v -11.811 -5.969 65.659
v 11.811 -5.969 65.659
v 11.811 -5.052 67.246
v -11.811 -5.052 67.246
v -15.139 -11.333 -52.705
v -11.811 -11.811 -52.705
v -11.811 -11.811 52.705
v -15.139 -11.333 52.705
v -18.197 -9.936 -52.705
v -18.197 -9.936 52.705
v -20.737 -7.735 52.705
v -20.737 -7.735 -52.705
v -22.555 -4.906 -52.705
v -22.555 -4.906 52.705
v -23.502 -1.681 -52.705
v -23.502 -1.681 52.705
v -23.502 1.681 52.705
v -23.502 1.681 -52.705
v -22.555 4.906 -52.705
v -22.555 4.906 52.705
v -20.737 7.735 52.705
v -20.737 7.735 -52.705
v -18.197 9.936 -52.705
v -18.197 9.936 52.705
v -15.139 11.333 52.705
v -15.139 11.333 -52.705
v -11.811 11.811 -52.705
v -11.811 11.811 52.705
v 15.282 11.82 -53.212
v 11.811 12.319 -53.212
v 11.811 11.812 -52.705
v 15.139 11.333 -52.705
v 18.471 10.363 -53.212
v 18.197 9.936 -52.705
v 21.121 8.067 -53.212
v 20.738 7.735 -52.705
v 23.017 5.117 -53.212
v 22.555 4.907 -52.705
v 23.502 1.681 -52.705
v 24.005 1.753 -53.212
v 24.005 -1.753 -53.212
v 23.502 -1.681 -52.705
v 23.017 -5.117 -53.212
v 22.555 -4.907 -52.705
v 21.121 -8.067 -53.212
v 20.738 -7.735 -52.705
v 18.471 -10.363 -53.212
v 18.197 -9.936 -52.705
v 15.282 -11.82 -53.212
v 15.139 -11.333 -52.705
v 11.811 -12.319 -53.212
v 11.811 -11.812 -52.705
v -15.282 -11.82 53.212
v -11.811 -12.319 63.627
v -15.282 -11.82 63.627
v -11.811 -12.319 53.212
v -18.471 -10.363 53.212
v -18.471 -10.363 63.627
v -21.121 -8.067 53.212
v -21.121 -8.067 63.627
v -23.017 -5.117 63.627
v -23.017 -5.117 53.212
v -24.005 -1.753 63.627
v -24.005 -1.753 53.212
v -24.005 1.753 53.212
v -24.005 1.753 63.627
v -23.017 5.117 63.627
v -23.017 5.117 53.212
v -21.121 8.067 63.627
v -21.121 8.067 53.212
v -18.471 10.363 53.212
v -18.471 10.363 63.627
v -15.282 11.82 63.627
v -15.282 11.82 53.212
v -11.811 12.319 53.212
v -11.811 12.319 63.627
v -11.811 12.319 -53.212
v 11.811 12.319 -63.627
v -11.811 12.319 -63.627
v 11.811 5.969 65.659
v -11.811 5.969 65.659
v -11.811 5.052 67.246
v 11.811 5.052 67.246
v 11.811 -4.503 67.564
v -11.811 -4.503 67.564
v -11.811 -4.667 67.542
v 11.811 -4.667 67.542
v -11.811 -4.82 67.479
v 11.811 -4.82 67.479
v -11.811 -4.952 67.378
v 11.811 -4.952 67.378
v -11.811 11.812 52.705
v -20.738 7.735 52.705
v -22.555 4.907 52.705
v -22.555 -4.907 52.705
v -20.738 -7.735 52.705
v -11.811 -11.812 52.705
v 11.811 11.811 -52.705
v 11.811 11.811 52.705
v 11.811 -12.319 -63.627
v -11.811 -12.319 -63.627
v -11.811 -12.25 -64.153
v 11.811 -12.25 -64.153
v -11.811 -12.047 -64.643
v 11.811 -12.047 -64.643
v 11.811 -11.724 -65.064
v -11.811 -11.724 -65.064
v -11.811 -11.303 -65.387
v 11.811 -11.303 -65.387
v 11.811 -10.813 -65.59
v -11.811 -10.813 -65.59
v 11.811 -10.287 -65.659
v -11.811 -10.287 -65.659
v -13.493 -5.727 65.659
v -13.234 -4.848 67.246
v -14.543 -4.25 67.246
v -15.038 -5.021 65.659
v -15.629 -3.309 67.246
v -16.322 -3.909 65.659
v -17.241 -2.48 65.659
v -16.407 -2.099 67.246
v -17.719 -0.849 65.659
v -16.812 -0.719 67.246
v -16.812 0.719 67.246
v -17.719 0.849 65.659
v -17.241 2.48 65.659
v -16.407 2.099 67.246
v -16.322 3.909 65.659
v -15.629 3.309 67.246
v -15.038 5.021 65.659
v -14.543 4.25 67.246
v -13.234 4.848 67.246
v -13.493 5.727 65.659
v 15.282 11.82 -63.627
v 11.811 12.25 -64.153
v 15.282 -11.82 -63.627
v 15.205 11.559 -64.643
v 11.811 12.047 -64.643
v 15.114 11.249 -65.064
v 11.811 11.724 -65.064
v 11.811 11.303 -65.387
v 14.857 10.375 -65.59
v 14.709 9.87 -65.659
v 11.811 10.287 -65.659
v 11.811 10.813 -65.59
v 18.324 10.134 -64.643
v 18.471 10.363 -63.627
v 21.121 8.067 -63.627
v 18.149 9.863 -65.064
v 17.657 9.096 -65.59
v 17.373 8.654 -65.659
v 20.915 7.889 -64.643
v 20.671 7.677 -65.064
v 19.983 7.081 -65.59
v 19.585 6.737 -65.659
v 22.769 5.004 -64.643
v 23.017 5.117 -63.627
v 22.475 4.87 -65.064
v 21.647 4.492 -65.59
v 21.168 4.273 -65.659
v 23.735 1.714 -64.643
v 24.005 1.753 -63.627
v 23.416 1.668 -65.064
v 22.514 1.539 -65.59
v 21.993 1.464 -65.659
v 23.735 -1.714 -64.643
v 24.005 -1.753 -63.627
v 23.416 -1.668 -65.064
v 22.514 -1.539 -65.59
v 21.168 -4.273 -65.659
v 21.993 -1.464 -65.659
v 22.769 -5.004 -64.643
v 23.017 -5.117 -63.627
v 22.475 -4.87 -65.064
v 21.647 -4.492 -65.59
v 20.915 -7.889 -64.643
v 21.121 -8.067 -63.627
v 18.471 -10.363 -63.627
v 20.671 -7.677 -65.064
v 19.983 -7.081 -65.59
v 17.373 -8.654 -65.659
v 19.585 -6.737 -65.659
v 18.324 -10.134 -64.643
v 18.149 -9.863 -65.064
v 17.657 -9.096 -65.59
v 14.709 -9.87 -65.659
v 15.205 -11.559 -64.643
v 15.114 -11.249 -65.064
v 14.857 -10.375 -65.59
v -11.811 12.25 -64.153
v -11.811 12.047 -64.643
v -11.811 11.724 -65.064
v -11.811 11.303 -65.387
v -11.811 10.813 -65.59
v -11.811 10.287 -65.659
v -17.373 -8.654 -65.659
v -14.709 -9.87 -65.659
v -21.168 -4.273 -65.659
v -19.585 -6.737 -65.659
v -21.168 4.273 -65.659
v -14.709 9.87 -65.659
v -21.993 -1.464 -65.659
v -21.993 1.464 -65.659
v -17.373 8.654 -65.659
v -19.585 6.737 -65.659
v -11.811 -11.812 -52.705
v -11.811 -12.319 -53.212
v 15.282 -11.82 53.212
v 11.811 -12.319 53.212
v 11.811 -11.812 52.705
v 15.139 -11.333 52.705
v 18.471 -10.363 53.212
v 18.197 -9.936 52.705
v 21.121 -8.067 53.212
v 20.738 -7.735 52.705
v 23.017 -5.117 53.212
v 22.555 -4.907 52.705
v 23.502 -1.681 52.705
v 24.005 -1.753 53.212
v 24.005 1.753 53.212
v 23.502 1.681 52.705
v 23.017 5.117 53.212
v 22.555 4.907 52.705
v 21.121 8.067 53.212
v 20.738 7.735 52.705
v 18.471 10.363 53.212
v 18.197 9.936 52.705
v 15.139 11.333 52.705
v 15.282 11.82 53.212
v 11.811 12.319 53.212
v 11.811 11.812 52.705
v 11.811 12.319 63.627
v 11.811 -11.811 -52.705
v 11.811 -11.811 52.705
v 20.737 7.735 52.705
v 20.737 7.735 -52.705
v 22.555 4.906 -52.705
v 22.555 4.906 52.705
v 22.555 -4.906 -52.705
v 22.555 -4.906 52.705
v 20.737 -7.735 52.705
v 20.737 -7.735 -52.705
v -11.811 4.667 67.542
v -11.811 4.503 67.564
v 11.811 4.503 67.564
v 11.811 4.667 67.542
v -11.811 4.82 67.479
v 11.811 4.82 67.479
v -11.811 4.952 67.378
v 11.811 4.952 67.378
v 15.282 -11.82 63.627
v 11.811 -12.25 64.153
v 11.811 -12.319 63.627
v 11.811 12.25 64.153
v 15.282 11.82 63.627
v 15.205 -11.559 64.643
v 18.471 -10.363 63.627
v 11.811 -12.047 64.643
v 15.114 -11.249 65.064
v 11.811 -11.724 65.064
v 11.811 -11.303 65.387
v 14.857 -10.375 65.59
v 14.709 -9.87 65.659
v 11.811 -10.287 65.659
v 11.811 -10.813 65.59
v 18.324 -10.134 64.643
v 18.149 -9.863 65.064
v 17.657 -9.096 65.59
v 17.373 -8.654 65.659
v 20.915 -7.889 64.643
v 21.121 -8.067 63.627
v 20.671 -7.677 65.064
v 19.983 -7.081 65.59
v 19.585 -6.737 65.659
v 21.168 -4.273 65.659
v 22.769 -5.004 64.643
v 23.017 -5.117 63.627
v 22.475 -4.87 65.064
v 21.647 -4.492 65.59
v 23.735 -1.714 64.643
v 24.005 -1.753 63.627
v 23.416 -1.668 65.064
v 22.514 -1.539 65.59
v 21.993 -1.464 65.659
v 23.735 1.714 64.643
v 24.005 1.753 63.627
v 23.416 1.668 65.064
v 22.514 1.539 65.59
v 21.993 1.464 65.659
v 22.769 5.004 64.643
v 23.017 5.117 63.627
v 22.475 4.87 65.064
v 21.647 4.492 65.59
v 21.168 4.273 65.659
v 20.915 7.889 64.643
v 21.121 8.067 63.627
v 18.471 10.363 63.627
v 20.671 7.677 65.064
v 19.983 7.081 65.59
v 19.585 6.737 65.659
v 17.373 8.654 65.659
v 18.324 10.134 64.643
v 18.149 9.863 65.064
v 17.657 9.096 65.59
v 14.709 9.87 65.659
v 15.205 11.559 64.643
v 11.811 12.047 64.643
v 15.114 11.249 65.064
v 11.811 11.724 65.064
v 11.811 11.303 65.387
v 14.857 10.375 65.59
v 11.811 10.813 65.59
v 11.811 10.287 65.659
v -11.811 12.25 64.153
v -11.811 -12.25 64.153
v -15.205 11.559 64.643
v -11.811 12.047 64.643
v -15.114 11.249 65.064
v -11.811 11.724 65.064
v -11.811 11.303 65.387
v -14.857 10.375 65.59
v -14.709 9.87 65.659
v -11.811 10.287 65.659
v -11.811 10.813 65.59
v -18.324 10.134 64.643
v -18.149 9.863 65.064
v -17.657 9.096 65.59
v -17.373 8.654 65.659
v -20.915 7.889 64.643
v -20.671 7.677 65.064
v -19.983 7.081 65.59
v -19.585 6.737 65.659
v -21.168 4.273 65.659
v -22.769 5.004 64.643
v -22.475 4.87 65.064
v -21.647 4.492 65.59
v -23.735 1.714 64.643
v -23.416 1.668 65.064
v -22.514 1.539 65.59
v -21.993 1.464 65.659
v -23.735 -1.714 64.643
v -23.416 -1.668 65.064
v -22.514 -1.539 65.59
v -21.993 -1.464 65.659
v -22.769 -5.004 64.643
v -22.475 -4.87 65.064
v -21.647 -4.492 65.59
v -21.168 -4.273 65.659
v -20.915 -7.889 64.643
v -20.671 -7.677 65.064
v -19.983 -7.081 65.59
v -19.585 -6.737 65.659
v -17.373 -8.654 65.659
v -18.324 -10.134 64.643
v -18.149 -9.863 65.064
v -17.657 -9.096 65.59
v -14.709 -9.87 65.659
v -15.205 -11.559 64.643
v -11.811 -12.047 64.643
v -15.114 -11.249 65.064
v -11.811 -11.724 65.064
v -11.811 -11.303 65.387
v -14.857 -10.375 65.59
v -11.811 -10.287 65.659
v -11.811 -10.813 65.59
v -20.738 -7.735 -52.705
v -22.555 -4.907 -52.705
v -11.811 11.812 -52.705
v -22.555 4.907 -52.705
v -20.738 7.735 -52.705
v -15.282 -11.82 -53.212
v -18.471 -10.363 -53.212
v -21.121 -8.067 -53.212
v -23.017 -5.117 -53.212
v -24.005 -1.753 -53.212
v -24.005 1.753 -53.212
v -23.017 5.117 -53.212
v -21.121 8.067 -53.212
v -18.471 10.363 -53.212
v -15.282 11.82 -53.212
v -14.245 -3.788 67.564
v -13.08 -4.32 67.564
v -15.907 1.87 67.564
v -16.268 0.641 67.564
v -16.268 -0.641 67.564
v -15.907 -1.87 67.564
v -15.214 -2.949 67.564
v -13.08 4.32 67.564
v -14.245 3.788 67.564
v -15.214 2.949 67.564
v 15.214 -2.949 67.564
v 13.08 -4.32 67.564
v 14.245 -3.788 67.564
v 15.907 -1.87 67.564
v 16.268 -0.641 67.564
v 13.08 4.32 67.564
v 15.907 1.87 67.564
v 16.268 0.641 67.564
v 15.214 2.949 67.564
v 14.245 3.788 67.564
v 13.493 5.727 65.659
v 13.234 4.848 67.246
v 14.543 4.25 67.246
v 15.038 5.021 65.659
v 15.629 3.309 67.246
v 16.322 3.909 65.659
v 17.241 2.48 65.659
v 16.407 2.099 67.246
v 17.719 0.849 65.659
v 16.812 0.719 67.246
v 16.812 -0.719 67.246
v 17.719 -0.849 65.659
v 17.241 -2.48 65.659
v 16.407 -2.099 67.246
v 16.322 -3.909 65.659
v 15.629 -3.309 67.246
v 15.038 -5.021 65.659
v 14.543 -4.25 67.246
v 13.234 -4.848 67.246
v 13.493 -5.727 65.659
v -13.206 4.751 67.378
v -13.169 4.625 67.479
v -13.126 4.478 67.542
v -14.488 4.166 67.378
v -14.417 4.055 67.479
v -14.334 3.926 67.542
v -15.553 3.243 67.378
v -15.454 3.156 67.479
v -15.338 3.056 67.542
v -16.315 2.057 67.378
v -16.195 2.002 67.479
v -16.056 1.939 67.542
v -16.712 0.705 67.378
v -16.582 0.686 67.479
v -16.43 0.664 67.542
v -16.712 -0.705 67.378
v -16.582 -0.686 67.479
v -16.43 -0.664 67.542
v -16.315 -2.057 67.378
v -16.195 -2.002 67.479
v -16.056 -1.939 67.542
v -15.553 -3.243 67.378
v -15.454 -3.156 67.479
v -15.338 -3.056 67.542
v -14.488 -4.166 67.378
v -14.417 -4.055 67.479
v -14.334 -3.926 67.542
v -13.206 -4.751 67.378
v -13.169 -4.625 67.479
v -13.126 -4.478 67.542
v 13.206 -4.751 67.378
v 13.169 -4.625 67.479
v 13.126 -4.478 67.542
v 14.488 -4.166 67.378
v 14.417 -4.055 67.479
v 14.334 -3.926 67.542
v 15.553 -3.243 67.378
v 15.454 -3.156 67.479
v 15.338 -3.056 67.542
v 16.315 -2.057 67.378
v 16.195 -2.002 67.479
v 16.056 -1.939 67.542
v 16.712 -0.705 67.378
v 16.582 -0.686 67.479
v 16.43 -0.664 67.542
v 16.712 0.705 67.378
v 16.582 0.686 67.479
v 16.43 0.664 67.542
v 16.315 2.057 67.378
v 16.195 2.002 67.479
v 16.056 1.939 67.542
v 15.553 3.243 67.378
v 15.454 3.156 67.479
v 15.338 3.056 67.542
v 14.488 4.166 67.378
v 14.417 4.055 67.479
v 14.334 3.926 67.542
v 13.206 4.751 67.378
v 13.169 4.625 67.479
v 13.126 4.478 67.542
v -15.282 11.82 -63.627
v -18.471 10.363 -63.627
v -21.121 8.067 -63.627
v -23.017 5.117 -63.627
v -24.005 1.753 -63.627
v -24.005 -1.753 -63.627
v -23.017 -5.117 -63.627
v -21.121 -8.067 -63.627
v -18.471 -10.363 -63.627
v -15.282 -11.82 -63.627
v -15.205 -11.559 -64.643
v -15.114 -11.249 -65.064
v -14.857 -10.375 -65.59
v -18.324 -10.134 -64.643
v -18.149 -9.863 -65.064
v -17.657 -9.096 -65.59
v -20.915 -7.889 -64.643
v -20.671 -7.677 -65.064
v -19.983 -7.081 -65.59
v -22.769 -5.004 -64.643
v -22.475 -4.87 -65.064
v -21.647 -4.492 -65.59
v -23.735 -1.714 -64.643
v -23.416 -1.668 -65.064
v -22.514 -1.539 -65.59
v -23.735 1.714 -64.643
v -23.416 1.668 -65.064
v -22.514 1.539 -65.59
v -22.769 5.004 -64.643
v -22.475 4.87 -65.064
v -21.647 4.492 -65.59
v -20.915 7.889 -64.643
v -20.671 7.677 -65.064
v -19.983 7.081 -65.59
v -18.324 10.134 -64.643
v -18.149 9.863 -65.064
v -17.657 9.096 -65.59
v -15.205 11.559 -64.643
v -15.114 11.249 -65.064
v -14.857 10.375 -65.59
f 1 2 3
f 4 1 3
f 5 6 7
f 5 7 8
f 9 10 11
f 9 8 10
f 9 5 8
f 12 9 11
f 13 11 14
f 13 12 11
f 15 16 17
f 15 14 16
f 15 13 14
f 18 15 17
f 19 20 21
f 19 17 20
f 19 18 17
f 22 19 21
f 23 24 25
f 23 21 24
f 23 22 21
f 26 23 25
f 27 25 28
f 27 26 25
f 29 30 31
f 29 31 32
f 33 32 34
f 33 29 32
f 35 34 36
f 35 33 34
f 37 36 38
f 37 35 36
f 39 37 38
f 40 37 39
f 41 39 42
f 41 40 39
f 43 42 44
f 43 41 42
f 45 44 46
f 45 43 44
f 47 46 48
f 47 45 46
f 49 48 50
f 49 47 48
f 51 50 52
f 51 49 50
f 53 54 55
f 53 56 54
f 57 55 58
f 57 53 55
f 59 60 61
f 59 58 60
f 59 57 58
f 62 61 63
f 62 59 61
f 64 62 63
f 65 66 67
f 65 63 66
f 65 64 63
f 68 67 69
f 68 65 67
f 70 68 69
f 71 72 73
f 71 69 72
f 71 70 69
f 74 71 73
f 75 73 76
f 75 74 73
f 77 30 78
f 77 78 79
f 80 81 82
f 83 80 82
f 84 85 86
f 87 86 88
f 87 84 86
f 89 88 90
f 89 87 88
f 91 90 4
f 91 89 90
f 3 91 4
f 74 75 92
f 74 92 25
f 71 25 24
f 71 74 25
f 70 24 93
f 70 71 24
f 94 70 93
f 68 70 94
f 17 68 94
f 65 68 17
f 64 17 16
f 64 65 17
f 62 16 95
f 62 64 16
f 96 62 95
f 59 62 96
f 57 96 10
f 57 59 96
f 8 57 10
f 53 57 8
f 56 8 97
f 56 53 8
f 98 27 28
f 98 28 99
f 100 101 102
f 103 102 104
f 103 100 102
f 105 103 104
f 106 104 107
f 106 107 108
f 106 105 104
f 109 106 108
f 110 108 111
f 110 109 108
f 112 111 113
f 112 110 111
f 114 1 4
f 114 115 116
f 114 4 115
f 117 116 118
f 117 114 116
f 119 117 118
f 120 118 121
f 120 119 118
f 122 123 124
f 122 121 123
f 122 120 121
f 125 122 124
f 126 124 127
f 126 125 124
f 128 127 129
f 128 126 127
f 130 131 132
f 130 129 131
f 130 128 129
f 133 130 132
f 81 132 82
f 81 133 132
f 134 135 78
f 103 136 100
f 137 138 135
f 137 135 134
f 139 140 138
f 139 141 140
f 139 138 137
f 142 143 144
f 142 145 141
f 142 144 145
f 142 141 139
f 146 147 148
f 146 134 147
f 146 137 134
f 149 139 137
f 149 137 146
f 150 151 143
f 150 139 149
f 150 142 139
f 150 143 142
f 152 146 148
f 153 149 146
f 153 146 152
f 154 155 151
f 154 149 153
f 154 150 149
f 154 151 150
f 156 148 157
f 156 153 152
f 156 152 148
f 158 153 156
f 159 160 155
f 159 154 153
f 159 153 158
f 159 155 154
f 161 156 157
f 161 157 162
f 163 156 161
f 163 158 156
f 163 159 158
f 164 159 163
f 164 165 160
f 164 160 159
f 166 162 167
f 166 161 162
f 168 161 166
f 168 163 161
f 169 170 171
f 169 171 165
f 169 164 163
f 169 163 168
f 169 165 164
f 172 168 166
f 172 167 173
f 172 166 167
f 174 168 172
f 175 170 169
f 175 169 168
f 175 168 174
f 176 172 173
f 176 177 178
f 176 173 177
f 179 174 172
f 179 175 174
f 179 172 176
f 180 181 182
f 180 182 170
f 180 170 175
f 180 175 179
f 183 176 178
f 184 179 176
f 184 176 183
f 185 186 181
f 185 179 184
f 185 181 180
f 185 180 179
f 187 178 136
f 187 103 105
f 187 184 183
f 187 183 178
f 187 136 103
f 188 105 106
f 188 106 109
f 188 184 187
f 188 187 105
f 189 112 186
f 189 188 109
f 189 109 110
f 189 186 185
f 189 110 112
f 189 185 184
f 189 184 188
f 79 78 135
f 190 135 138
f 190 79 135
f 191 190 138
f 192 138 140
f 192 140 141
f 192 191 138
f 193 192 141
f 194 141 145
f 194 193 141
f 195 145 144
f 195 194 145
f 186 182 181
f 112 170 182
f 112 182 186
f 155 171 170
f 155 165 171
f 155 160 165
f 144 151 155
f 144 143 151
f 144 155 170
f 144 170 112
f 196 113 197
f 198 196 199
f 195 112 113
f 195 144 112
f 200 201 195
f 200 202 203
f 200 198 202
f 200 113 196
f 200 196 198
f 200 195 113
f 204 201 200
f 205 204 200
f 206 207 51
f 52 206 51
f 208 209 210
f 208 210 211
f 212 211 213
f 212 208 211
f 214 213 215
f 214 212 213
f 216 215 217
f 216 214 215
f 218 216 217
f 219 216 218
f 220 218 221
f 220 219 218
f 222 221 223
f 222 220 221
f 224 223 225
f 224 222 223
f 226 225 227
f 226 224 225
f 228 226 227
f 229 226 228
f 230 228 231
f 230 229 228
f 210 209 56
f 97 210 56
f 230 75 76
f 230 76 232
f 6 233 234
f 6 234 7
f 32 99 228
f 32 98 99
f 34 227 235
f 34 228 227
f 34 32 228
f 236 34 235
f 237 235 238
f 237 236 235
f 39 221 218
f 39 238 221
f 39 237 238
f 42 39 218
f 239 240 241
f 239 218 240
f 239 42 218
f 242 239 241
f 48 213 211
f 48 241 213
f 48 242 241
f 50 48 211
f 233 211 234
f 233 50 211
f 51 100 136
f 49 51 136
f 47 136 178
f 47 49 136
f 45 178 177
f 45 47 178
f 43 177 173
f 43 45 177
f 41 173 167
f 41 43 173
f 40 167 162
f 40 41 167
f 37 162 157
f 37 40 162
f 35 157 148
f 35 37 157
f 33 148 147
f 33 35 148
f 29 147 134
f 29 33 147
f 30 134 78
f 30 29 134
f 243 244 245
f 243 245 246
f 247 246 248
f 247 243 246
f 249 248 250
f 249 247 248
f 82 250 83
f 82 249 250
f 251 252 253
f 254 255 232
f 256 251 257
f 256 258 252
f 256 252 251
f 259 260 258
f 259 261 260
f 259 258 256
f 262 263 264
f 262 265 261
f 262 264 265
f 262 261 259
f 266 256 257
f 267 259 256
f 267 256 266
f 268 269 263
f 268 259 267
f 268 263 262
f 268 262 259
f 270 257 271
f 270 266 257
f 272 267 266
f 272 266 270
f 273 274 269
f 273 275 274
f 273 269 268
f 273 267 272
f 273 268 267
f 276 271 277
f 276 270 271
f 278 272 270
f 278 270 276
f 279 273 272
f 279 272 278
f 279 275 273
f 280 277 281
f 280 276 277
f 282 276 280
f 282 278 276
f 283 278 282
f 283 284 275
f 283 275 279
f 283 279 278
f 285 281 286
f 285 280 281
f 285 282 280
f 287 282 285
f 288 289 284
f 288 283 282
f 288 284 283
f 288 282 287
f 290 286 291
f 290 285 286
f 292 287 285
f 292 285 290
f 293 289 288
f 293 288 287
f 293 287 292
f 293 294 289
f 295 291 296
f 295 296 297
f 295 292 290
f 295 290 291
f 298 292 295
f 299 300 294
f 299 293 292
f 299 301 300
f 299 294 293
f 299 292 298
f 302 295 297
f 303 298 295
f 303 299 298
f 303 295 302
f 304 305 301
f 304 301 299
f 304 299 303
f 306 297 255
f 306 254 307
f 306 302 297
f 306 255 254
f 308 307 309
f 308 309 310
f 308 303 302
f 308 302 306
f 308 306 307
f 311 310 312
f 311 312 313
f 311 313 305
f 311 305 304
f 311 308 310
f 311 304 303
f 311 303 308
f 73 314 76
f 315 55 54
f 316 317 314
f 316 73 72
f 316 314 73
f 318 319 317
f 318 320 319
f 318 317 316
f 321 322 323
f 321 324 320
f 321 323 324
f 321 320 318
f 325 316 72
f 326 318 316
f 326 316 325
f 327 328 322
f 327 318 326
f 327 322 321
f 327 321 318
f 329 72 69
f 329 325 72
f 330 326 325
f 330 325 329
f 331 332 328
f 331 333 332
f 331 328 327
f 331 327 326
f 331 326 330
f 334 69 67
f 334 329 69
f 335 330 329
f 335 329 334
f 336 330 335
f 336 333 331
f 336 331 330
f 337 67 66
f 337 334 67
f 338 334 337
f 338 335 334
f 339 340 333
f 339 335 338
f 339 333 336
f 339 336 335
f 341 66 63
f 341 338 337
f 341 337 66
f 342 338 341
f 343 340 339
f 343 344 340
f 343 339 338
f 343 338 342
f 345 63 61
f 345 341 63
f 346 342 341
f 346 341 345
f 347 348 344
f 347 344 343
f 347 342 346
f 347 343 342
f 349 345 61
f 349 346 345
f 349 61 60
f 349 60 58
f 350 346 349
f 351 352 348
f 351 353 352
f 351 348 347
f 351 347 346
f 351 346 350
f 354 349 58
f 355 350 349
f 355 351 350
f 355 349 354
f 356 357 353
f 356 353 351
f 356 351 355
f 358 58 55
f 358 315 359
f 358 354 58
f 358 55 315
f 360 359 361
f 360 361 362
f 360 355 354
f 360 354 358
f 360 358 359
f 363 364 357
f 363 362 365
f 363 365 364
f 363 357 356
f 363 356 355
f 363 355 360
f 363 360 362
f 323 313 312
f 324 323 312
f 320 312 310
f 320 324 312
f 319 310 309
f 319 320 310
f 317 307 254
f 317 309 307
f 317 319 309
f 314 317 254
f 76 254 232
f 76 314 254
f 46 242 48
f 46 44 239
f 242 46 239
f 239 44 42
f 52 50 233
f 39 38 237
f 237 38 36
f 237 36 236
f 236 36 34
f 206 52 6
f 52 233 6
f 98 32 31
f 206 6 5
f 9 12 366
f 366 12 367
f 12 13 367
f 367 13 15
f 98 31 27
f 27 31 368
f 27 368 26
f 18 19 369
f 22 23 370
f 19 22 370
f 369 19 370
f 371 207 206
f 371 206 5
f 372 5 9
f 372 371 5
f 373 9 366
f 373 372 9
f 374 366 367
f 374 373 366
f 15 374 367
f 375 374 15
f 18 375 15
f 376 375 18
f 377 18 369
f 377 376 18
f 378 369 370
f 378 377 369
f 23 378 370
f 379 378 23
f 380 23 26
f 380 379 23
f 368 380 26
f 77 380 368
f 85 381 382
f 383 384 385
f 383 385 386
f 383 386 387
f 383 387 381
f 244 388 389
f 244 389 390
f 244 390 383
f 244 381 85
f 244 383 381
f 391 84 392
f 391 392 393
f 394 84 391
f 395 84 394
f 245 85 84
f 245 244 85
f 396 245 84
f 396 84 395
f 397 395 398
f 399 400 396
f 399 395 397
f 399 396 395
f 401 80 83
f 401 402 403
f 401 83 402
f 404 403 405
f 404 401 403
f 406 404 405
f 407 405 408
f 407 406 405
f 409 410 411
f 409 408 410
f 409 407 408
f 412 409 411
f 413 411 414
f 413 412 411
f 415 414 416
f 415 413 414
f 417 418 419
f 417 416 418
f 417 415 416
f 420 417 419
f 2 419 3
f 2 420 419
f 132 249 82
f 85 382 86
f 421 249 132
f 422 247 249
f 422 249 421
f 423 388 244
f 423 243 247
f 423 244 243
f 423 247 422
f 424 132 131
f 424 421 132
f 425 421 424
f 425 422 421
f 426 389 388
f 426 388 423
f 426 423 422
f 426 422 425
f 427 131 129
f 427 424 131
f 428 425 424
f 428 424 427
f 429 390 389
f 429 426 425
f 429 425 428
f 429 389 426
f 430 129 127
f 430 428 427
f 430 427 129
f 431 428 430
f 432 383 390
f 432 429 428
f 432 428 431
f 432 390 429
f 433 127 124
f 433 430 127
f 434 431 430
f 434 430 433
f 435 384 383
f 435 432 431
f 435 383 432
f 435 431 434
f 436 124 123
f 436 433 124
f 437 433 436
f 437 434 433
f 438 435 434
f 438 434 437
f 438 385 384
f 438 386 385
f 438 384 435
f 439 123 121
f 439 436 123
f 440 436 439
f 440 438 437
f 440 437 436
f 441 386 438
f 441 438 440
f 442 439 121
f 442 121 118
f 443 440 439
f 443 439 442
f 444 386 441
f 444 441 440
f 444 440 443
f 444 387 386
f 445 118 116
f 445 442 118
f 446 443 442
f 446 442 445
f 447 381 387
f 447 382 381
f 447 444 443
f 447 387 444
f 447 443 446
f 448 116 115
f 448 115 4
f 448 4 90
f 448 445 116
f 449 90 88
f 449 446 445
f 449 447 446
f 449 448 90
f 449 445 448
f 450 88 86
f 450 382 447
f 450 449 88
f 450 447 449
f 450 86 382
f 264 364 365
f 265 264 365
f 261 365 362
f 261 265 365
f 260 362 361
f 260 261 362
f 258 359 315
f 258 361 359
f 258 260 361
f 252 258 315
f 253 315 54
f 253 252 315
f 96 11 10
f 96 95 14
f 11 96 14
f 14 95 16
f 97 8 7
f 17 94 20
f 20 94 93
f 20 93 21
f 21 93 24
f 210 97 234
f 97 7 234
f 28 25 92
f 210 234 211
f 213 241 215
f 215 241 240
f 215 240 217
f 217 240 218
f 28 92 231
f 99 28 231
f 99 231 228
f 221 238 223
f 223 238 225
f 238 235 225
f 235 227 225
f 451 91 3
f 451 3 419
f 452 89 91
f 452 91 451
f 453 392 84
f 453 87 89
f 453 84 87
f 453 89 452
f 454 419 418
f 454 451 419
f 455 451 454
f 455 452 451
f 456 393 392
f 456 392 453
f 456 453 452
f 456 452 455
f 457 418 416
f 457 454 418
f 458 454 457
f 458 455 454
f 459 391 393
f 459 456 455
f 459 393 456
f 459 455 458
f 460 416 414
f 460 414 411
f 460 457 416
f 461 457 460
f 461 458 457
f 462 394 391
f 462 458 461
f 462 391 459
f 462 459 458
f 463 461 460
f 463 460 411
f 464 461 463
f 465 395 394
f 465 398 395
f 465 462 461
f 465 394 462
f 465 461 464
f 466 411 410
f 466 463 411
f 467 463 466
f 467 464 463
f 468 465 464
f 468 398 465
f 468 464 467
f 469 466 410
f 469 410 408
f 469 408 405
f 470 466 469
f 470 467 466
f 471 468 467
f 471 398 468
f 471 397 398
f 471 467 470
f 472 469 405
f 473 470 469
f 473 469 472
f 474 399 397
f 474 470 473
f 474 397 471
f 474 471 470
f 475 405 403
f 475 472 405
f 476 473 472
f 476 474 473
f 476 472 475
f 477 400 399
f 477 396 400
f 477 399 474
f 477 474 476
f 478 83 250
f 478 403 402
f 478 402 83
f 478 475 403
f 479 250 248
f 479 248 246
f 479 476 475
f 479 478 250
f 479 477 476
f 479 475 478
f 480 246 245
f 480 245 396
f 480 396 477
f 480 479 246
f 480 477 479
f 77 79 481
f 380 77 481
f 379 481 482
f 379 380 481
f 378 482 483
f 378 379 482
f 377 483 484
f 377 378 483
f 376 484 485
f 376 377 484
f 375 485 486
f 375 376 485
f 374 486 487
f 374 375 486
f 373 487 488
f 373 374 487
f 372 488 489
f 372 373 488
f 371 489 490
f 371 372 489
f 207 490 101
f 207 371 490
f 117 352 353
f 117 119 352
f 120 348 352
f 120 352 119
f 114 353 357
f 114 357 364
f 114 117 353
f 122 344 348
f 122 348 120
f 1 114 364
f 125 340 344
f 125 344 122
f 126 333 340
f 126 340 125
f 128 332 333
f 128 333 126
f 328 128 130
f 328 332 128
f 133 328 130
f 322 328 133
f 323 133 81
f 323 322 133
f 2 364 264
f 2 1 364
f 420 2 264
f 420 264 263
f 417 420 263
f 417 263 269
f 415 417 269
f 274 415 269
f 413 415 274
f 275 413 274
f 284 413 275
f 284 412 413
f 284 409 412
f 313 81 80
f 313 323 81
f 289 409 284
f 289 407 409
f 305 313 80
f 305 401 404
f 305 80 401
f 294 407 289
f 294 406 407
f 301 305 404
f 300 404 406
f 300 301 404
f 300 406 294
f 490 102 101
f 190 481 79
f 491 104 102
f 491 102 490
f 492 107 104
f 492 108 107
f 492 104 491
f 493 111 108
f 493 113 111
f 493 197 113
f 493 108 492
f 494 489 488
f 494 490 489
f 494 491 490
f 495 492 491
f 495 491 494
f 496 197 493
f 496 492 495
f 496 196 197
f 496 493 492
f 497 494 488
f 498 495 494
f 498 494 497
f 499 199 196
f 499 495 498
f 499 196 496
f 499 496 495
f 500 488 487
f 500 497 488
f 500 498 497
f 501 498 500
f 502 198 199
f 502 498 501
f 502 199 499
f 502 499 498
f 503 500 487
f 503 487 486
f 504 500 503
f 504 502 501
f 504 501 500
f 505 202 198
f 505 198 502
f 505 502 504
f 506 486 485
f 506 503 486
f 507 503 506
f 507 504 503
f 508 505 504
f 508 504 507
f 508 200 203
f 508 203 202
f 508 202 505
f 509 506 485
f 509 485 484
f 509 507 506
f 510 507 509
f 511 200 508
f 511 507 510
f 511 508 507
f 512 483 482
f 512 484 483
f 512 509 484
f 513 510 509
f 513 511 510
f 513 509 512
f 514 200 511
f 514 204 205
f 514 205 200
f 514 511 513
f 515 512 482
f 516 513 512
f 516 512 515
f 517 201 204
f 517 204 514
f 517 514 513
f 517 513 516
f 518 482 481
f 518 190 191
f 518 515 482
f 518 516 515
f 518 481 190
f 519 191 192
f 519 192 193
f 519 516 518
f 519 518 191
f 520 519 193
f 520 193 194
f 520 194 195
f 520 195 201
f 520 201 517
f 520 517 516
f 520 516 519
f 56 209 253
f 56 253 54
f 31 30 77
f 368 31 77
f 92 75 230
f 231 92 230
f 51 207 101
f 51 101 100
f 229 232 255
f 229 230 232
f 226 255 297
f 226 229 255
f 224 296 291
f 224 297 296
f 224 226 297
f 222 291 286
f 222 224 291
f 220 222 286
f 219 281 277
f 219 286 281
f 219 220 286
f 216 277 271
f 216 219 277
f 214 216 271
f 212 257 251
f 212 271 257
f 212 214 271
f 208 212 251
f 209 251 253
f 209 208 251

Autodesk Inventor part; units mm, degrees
ref_plane "YZ Plane" through (0, 0, 0) normal (1, 0, 0) x (0, 1, 0)
ref_plane "XZ Plane" through (0, 0, 0) normal (0, 1, 0) x (-1, 0, 0)
ref_plane "XY Plane" through (0, 0, 0) normal (0, 0, 1) x (1, 0, 0)
sketch "Sketch1" plane through (0, 0, 0) normal (0, 0, 1) x (1, 0, 0)
  arc A0 (-11.811, 11.811) -> (-11.811, -11.811) centre (-11.811, 0) ccw
  line L0 (-11.811, 11.811) -> (11.811, 11.811)
  arc A1 (11.811, -11.811) -> (11.811, 11.811) centre (11.811, 0) ccw
  line L1 (11.811, -11.811) -> (-11.811, -11.811)
  point P0 (0, 0)
  point P1 (0, 0)
extrude "Extrusion1" add sketch "Sketch1" along normal mid plane 105.41
sketch "Sketch2" plane through (0, 0, 52.705) normal (0, 0, 1) x (1, 0, 0)
  arc A0 (11.811, -12.319) -> (11.811, 12.319) centre (11.811, 0) ccw
  line L0 (11.811, -12.319) -> (-11.811, -12.319)
  arc A1 (-11.811, 12.319) -> (-11.811, -12.319) centre (-11.811, 0) ccw
  line L1 (-11.811, 12.319) -> (11.811, 12.319)
  point P0 (0, 0)
  point P1 (0, 0)
extrude "Extrusion2" add sketch "Sketch2" along normal blind 12.954
fillet "Fillet1" radius 2.032 4 edges at (-24.13, 0, 65.659) (0, 12.319, 65.659) (24.13, 0, 65.659) (0, -12.319, 65.659)
chamfer "Chamfer1" distance 0.508 angle 45 4 edges at (0, 12.319, 52.705) (24.13, 0, 52.705) (0, -12.319, 52.705) (-24.13, 0, 52.705)
mirror "Mirror1" about plane through (0, 0, 0) normal (0, 0, 1) of "Extrusion2", "Fillet1", "Chamfer1"
sketch "Sketch3" plane through (0, 0, 65.659) normal (0, 0, 1) x (1, 0, 0)
  line L0 (11.811, 5.969) -> (-11.811, 5.969)
  arc A0 (11.811, -5.969) -> (11.811, 5.969) centre (11.811, 0) ccw
  line L1 (-11.811, -5.969) -> (11.811, -5.969)
  arc A1 (-11.811, 5.969) -> (-11.811, -5.969) centre (-11.811, 0) ccw
  point P0 (0, 0)
  point P1 (11.811, 0)
  point P2 (-11.811, 0)
  point P3 (0, 0)
extrude "Extrusion3" add sketch "Sketch3" along normal blind 1.905 draft -30
fillet "Fillet2" radius 0.635 4 edges at (0, 4.8691, 67.564) (16.6801, 0, 67.564) (0, -4.8691, 67.564) (-16.6801, 0, 67.564)
properties part number "276-1491"
